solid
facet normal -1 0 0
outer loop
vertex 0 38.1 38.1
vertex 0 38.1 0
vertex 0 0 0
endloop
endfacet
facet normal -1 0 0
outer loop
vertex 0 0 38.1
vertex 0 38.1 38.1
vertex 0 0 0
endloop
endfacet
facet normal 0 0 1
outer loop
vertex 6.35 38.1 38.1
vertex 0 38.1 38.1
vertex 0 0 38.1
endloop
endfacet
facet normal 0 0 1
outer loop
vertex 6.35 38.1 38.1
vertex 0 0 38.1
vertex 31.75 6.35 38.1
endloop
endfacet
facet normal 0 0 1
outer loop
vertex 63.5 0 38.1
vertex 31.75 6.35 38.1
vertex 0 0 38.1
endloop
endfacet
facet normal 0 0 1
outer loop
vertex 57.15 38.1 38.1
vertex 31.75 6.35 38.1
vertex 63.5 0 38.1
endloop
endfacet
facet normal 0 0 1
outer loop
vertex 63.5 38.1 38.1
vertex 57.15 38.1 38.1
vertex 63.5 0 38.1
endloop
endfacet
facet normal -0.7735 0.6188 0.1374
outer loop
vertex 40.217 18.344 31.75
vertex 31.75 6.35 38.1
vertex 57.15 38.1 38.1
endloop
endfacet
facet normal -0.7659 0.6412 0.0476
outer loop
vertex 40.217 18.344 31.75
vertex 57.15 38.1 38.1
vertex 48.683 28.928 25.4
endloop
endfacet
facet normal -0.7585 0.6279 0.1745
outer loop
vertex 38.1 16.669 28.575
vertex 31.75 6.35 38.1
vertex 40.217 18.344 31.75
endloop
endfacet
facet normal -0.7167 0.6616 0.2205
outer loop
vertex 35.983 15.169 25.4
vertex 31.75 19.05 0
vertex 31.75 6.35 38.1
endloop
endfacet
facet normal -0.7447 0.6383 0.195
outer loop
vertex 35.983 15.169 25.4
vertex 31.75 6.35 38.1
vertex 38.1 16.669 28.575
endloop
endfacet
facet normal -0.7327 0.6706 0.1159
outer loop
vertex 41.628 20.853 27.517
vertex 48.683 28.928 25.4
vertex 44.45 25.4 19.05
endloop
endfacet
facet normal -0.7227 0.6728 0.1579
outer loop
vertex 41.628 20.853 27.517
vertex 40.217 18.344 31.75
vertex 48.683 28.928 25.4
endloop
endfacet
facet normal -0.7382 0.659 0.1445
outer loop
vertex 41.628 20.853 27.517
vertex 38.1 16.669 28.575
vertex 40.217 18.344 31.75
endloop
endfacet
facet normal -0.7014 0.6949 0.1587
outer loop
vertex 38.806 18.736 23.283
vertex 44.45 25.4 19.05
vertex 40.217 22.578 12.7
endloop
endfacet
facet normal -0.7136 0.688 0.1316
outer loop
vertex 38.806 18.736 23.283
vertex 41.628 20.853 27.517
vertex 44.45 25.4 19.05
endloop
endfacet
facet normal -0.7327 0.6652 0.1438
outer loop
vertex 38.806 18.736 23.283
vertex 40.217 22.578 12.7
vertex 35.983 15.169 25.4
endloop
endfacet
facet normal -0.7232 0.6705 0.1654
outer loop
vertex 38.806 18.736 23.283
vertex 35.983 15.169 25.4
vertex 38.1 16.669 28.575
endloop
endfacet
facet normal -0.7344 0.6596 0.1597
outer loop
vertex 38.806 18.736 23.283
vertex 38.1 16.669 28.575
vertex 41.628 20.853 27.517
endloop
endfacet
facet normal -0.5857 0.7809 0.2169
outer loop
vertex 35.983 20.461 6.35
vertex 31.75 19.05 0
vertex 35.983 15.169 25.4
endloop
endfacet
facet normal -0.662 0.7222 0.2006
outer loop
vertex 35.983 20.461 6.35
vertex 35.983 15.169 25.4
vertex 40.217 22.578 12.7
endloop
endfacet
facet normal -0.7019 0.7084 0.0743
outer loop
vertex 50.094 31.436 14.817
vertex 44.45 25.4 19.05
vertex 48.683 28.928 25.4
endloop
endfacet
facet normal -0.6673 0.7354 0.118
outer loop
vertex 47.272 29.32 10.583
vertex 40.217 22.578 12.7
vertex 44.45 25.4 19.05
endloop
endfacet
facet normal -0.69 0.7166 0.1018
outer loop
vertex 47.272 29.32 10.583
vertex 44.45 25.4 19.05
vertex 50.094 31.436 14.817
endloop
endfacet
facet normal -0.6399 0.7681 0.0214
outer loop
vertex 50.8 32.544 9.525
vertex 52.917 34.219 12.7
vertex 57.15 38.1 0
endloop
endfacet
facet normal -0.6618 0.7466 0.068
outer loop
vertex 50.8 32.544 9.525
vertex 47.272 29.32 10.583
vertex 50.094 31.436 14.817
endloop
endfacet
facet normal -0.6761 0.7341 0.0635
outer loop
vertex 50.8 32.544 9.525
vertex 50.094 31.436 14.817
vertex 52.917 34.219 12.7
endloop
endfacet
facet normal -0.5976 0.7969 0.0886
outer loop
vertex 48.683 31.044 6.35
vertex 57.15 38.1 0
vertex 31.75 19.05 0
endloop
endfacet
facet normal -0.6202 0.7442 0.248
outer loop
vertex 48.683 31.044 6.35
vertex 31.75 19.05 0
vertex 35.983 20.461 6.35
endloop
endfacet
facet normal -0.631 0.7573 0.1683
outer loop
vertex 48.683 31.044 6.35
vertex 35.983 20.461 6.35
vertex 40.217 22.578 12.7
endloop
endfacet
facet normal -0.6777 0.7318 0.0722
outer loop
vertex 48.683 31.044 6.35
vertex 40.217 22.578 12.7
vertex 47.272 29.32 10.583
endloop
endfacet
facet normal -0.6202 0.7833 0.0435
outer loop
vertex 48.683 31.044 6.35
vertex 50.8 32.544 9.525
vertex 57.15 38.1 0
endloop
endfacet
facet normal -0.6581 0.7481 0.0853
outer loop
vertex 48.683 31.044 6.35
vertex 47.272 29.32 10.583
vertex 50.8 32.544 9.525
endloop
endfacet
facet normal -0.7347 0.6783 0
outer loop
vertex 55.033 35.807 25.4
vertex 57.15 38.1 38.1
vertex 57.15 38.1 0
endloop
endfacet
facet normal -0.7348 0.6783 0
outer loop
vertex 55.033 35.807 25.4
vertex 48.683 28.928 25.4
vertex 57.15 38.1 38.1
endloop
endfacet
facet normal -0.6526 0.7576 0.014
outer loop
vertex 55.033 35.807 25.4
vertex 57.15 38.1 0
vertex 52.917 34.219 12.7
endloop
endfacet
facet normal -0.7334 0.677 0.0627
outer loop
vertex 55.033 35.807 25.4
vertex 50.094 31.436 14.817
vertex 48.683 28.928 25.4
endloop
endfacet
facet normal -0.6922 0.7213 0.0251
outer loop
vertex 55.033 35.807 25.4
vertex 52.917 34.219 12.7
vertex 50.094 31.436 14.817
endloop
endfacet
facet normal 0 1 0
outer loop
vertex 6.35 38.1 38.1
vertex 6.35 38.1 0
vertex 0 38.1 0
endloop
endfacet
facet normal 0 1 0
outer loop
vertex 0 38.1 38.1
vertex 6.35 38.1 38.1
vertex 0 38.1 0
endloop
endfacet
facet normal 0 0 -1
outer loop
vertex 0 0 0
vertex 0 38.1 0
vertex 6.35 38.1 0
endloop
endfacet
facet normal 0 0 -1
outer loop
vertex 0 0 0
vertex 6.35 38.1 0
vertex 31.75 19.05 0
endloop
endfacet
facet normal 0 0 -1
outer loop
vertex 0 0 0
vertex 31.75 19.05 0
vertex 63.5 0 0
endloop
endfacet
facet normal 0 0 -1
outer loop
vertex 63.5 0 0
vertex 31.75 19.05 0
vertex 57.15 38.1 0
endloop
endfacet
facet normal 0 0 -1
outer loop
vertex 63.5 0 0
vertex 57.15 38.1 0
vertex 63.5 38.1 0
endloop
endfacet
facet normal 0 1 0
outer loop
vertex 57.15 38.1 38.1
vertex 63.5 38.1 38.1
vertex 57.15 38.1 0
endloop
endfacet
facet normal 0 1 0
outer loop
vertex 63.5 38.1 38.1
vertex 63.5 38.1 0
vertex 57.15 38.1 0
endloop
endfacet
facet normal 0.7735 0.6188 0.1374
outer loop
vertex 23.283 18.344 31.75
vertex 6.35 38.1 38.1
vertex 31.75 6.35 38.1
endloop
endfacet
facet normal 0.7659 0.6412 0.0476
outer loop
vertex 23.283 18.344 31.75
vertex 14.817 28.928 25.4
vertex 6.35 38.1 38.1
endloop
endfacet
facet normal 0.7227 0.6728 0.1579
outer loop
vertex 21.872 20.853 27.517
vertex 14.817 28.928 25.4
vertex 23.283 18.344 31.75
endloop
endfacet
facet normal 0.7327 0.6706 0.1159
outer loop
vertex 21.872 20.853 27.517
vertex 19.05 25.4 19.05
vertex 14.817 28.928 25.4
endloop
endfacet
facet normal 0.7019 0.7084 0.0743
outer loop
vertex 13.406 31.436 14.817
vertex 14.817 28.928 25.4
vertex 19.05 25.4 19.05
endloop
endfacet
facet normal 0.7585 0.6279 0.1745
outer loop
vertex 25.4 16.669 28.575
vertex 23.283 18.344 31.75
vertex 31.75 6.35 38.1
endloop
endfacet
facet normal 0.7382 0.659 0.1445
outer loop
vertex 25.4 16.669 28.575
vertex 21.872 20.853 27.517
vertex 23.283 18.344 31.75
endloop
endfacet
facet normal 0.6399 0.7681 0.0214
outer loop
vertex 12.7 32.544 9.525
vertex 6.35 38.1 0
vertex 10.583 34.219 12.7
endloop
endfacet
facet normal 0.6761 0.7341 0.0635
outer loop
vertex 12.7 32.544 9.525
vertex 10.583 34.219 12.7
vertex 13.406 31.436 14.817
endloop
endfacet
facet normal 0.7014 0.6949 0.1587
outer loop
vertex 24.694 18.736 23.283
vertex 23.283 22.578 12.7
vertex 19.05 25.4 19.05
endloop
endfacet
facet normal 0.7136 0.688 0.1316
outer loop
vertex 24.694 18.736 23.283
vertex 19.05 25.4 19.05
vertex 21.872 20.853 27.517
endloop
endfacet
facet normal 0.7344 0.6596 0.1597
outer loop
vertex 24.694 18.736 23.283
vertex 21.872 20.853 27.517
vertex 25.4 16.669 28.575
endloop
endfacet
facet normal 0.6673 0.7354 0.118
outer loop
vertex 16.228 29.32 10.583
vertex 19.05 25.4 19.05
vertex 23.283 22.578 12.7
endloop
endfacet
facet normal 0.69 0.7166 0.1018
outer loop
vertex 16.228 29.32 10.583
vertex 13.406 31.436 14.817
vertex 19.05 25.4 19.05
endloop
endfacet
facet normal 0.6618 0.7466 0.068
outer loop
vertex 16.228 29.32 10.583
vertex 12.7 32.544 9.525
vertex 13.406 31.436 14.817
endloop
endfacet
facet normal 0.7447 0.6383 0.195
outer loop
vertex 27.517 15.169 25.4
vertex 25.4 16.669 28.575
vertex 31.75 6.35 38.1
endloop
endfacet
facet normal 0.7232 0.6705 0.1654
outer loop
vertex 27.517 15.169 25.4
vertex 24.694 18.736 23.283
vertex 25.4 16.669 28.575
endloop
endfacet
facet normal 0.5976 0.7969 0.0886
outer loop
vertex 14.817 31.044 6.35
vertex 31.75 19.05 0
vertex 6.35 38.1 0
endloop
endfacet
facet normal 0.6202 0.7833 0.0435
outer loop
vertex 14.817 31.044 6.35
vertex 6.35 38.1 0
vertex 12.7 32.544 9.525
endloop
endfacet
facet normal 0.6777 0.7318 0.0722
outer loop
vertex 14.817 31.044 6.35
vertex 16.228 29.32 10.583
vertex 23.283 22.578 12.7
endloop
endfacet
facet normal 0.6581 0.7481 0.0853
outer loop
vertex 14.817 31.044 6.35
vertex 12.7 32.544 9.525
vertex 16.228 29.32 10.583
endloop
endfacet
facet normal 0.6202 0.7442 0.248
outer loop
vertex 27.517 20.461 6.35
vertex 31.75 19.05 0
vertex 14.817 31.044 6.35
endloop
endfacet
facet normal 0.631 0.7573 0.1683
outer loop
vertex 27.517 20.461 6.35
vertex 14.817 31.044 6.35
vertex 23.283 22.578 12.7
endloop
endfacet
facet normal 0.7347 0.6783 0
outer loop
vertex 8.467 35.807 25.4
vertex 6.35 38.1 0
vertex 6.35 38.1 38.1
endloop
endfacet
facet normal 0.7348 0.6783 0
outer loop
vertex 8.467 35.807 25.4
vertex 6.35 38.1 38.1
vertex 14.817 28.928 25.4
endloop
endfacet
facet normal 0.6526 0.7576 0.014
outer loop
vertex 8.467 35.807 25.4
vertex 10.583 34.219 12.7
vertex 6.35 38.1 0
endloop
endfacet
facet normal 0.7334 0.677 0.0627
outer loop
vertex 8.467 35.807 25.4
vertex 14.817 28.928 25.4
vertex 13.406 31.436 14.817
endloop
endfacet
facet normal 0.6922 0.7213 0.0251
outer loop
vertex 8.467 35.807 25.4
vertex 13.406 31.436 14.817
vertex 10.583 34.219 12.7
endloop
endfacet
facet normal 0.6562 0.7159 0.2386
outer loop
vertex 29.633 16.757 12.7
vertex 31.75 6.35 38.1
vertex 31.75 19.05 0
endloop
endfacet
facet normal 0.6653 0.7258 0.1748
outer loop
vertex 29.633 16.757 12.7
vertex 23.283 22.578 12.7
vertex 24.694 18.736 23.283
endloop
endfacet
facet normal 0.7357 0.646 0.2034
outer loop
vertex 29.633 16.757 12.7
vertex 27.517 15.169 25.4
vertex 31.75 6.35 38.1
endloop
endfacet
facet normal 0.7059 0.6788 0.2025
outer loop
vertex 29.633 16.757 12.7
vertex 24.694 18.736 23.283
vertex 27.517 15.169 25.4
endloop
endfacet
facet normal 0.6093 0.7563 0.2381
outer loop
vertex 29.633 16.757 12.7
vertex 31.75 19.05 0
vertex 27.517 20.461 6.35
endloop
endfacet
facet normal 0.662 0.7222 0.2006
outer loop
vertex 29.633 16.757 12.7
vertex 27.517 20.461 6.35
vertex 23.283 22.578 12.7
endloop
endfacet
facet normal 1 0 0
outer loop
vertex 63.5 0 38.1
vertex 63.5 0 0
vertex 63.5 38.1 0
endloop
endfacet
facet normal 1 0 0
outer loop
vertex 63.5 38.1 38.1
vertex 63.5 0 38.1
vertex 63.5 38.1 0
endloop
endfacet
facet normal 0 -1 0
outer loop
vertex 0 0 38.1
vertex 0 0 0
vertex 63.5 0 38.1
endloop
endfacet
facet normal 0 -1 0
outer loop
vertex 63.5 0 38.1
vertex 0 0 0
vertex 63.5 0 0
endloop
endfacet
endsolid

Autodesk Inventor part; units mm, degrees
ref_plane "YZ Plane" through (0, 0, 0) normal (1, 0, 0) x (0, 1, 0)
ref_plane "XZ Plane" through (0, 0, 0) normal (0, 1, 0) x (-1, 0, 0)
ref_plane "XY Plane" through (0, 0, 0) normal (0, 0, 1) x (1, 0, 0)
sketch "Sketch1" plane through (0, 0, 0) normal (0, 0, 1) x (1, 0, 0)
  line L0 (0, 0) -> (63.5, 0)
  line L1 (63.5, 0) -> (63.5, 38.1)
  line L2 (63.5, 38.1) -> (0, 38.1)
  line L3 (0, 38.1) -> (0, 0)
  dimension "d0" = 38.1
  dimension "d1" = 63.5
extrude "Extrusion1" add sketch "Sketch1" along normal blind 38.1
sketch "Sketch2" plane through (0, 0, 38.1) normal (0, 0, 1) x (1, 0, 0)
  line L0 (6.35, 38.1) -> (31.75, 6.35)
  line L1 (31.75, 6.35) -> (57.15, 38.1)
  line L2 (6.35, 38.1) -> (57.15, 38.1)
  point P0 (63.5, 38.1)
  point P1 (0, 38.1)
  dimension "d4" = 6.35
  dimension "d5" = 6.35
sketch "Sketch3" plane through (0, 0, 0) normal (0, 0, -1) x (-1, 0, 0)
  line L0 (-57.15, 38.1) -> (-31.75, 19.05)
  line L1 (-31.75, 19.05) -> (-6.35, 38.1)
  line L2 (-57.15, 38.1) -> (-6.35, 38.1)
  line L3 (-63.5, 0) -> (-63.5, 38.1) projected
  line L4 (0, 38.1) -> (0, 0) projected
  line L5 (0, 0) -> (-63.5, 0) projected
  dimension "d8" = 6.35
  dimension "d9" = 6.35
  dimension "d10" = 19.05
  dimension "d11" = 31.75
loft "Loft1" cut profiles "Sketch2", "Sketch3"
properties part number "LoftCut"
